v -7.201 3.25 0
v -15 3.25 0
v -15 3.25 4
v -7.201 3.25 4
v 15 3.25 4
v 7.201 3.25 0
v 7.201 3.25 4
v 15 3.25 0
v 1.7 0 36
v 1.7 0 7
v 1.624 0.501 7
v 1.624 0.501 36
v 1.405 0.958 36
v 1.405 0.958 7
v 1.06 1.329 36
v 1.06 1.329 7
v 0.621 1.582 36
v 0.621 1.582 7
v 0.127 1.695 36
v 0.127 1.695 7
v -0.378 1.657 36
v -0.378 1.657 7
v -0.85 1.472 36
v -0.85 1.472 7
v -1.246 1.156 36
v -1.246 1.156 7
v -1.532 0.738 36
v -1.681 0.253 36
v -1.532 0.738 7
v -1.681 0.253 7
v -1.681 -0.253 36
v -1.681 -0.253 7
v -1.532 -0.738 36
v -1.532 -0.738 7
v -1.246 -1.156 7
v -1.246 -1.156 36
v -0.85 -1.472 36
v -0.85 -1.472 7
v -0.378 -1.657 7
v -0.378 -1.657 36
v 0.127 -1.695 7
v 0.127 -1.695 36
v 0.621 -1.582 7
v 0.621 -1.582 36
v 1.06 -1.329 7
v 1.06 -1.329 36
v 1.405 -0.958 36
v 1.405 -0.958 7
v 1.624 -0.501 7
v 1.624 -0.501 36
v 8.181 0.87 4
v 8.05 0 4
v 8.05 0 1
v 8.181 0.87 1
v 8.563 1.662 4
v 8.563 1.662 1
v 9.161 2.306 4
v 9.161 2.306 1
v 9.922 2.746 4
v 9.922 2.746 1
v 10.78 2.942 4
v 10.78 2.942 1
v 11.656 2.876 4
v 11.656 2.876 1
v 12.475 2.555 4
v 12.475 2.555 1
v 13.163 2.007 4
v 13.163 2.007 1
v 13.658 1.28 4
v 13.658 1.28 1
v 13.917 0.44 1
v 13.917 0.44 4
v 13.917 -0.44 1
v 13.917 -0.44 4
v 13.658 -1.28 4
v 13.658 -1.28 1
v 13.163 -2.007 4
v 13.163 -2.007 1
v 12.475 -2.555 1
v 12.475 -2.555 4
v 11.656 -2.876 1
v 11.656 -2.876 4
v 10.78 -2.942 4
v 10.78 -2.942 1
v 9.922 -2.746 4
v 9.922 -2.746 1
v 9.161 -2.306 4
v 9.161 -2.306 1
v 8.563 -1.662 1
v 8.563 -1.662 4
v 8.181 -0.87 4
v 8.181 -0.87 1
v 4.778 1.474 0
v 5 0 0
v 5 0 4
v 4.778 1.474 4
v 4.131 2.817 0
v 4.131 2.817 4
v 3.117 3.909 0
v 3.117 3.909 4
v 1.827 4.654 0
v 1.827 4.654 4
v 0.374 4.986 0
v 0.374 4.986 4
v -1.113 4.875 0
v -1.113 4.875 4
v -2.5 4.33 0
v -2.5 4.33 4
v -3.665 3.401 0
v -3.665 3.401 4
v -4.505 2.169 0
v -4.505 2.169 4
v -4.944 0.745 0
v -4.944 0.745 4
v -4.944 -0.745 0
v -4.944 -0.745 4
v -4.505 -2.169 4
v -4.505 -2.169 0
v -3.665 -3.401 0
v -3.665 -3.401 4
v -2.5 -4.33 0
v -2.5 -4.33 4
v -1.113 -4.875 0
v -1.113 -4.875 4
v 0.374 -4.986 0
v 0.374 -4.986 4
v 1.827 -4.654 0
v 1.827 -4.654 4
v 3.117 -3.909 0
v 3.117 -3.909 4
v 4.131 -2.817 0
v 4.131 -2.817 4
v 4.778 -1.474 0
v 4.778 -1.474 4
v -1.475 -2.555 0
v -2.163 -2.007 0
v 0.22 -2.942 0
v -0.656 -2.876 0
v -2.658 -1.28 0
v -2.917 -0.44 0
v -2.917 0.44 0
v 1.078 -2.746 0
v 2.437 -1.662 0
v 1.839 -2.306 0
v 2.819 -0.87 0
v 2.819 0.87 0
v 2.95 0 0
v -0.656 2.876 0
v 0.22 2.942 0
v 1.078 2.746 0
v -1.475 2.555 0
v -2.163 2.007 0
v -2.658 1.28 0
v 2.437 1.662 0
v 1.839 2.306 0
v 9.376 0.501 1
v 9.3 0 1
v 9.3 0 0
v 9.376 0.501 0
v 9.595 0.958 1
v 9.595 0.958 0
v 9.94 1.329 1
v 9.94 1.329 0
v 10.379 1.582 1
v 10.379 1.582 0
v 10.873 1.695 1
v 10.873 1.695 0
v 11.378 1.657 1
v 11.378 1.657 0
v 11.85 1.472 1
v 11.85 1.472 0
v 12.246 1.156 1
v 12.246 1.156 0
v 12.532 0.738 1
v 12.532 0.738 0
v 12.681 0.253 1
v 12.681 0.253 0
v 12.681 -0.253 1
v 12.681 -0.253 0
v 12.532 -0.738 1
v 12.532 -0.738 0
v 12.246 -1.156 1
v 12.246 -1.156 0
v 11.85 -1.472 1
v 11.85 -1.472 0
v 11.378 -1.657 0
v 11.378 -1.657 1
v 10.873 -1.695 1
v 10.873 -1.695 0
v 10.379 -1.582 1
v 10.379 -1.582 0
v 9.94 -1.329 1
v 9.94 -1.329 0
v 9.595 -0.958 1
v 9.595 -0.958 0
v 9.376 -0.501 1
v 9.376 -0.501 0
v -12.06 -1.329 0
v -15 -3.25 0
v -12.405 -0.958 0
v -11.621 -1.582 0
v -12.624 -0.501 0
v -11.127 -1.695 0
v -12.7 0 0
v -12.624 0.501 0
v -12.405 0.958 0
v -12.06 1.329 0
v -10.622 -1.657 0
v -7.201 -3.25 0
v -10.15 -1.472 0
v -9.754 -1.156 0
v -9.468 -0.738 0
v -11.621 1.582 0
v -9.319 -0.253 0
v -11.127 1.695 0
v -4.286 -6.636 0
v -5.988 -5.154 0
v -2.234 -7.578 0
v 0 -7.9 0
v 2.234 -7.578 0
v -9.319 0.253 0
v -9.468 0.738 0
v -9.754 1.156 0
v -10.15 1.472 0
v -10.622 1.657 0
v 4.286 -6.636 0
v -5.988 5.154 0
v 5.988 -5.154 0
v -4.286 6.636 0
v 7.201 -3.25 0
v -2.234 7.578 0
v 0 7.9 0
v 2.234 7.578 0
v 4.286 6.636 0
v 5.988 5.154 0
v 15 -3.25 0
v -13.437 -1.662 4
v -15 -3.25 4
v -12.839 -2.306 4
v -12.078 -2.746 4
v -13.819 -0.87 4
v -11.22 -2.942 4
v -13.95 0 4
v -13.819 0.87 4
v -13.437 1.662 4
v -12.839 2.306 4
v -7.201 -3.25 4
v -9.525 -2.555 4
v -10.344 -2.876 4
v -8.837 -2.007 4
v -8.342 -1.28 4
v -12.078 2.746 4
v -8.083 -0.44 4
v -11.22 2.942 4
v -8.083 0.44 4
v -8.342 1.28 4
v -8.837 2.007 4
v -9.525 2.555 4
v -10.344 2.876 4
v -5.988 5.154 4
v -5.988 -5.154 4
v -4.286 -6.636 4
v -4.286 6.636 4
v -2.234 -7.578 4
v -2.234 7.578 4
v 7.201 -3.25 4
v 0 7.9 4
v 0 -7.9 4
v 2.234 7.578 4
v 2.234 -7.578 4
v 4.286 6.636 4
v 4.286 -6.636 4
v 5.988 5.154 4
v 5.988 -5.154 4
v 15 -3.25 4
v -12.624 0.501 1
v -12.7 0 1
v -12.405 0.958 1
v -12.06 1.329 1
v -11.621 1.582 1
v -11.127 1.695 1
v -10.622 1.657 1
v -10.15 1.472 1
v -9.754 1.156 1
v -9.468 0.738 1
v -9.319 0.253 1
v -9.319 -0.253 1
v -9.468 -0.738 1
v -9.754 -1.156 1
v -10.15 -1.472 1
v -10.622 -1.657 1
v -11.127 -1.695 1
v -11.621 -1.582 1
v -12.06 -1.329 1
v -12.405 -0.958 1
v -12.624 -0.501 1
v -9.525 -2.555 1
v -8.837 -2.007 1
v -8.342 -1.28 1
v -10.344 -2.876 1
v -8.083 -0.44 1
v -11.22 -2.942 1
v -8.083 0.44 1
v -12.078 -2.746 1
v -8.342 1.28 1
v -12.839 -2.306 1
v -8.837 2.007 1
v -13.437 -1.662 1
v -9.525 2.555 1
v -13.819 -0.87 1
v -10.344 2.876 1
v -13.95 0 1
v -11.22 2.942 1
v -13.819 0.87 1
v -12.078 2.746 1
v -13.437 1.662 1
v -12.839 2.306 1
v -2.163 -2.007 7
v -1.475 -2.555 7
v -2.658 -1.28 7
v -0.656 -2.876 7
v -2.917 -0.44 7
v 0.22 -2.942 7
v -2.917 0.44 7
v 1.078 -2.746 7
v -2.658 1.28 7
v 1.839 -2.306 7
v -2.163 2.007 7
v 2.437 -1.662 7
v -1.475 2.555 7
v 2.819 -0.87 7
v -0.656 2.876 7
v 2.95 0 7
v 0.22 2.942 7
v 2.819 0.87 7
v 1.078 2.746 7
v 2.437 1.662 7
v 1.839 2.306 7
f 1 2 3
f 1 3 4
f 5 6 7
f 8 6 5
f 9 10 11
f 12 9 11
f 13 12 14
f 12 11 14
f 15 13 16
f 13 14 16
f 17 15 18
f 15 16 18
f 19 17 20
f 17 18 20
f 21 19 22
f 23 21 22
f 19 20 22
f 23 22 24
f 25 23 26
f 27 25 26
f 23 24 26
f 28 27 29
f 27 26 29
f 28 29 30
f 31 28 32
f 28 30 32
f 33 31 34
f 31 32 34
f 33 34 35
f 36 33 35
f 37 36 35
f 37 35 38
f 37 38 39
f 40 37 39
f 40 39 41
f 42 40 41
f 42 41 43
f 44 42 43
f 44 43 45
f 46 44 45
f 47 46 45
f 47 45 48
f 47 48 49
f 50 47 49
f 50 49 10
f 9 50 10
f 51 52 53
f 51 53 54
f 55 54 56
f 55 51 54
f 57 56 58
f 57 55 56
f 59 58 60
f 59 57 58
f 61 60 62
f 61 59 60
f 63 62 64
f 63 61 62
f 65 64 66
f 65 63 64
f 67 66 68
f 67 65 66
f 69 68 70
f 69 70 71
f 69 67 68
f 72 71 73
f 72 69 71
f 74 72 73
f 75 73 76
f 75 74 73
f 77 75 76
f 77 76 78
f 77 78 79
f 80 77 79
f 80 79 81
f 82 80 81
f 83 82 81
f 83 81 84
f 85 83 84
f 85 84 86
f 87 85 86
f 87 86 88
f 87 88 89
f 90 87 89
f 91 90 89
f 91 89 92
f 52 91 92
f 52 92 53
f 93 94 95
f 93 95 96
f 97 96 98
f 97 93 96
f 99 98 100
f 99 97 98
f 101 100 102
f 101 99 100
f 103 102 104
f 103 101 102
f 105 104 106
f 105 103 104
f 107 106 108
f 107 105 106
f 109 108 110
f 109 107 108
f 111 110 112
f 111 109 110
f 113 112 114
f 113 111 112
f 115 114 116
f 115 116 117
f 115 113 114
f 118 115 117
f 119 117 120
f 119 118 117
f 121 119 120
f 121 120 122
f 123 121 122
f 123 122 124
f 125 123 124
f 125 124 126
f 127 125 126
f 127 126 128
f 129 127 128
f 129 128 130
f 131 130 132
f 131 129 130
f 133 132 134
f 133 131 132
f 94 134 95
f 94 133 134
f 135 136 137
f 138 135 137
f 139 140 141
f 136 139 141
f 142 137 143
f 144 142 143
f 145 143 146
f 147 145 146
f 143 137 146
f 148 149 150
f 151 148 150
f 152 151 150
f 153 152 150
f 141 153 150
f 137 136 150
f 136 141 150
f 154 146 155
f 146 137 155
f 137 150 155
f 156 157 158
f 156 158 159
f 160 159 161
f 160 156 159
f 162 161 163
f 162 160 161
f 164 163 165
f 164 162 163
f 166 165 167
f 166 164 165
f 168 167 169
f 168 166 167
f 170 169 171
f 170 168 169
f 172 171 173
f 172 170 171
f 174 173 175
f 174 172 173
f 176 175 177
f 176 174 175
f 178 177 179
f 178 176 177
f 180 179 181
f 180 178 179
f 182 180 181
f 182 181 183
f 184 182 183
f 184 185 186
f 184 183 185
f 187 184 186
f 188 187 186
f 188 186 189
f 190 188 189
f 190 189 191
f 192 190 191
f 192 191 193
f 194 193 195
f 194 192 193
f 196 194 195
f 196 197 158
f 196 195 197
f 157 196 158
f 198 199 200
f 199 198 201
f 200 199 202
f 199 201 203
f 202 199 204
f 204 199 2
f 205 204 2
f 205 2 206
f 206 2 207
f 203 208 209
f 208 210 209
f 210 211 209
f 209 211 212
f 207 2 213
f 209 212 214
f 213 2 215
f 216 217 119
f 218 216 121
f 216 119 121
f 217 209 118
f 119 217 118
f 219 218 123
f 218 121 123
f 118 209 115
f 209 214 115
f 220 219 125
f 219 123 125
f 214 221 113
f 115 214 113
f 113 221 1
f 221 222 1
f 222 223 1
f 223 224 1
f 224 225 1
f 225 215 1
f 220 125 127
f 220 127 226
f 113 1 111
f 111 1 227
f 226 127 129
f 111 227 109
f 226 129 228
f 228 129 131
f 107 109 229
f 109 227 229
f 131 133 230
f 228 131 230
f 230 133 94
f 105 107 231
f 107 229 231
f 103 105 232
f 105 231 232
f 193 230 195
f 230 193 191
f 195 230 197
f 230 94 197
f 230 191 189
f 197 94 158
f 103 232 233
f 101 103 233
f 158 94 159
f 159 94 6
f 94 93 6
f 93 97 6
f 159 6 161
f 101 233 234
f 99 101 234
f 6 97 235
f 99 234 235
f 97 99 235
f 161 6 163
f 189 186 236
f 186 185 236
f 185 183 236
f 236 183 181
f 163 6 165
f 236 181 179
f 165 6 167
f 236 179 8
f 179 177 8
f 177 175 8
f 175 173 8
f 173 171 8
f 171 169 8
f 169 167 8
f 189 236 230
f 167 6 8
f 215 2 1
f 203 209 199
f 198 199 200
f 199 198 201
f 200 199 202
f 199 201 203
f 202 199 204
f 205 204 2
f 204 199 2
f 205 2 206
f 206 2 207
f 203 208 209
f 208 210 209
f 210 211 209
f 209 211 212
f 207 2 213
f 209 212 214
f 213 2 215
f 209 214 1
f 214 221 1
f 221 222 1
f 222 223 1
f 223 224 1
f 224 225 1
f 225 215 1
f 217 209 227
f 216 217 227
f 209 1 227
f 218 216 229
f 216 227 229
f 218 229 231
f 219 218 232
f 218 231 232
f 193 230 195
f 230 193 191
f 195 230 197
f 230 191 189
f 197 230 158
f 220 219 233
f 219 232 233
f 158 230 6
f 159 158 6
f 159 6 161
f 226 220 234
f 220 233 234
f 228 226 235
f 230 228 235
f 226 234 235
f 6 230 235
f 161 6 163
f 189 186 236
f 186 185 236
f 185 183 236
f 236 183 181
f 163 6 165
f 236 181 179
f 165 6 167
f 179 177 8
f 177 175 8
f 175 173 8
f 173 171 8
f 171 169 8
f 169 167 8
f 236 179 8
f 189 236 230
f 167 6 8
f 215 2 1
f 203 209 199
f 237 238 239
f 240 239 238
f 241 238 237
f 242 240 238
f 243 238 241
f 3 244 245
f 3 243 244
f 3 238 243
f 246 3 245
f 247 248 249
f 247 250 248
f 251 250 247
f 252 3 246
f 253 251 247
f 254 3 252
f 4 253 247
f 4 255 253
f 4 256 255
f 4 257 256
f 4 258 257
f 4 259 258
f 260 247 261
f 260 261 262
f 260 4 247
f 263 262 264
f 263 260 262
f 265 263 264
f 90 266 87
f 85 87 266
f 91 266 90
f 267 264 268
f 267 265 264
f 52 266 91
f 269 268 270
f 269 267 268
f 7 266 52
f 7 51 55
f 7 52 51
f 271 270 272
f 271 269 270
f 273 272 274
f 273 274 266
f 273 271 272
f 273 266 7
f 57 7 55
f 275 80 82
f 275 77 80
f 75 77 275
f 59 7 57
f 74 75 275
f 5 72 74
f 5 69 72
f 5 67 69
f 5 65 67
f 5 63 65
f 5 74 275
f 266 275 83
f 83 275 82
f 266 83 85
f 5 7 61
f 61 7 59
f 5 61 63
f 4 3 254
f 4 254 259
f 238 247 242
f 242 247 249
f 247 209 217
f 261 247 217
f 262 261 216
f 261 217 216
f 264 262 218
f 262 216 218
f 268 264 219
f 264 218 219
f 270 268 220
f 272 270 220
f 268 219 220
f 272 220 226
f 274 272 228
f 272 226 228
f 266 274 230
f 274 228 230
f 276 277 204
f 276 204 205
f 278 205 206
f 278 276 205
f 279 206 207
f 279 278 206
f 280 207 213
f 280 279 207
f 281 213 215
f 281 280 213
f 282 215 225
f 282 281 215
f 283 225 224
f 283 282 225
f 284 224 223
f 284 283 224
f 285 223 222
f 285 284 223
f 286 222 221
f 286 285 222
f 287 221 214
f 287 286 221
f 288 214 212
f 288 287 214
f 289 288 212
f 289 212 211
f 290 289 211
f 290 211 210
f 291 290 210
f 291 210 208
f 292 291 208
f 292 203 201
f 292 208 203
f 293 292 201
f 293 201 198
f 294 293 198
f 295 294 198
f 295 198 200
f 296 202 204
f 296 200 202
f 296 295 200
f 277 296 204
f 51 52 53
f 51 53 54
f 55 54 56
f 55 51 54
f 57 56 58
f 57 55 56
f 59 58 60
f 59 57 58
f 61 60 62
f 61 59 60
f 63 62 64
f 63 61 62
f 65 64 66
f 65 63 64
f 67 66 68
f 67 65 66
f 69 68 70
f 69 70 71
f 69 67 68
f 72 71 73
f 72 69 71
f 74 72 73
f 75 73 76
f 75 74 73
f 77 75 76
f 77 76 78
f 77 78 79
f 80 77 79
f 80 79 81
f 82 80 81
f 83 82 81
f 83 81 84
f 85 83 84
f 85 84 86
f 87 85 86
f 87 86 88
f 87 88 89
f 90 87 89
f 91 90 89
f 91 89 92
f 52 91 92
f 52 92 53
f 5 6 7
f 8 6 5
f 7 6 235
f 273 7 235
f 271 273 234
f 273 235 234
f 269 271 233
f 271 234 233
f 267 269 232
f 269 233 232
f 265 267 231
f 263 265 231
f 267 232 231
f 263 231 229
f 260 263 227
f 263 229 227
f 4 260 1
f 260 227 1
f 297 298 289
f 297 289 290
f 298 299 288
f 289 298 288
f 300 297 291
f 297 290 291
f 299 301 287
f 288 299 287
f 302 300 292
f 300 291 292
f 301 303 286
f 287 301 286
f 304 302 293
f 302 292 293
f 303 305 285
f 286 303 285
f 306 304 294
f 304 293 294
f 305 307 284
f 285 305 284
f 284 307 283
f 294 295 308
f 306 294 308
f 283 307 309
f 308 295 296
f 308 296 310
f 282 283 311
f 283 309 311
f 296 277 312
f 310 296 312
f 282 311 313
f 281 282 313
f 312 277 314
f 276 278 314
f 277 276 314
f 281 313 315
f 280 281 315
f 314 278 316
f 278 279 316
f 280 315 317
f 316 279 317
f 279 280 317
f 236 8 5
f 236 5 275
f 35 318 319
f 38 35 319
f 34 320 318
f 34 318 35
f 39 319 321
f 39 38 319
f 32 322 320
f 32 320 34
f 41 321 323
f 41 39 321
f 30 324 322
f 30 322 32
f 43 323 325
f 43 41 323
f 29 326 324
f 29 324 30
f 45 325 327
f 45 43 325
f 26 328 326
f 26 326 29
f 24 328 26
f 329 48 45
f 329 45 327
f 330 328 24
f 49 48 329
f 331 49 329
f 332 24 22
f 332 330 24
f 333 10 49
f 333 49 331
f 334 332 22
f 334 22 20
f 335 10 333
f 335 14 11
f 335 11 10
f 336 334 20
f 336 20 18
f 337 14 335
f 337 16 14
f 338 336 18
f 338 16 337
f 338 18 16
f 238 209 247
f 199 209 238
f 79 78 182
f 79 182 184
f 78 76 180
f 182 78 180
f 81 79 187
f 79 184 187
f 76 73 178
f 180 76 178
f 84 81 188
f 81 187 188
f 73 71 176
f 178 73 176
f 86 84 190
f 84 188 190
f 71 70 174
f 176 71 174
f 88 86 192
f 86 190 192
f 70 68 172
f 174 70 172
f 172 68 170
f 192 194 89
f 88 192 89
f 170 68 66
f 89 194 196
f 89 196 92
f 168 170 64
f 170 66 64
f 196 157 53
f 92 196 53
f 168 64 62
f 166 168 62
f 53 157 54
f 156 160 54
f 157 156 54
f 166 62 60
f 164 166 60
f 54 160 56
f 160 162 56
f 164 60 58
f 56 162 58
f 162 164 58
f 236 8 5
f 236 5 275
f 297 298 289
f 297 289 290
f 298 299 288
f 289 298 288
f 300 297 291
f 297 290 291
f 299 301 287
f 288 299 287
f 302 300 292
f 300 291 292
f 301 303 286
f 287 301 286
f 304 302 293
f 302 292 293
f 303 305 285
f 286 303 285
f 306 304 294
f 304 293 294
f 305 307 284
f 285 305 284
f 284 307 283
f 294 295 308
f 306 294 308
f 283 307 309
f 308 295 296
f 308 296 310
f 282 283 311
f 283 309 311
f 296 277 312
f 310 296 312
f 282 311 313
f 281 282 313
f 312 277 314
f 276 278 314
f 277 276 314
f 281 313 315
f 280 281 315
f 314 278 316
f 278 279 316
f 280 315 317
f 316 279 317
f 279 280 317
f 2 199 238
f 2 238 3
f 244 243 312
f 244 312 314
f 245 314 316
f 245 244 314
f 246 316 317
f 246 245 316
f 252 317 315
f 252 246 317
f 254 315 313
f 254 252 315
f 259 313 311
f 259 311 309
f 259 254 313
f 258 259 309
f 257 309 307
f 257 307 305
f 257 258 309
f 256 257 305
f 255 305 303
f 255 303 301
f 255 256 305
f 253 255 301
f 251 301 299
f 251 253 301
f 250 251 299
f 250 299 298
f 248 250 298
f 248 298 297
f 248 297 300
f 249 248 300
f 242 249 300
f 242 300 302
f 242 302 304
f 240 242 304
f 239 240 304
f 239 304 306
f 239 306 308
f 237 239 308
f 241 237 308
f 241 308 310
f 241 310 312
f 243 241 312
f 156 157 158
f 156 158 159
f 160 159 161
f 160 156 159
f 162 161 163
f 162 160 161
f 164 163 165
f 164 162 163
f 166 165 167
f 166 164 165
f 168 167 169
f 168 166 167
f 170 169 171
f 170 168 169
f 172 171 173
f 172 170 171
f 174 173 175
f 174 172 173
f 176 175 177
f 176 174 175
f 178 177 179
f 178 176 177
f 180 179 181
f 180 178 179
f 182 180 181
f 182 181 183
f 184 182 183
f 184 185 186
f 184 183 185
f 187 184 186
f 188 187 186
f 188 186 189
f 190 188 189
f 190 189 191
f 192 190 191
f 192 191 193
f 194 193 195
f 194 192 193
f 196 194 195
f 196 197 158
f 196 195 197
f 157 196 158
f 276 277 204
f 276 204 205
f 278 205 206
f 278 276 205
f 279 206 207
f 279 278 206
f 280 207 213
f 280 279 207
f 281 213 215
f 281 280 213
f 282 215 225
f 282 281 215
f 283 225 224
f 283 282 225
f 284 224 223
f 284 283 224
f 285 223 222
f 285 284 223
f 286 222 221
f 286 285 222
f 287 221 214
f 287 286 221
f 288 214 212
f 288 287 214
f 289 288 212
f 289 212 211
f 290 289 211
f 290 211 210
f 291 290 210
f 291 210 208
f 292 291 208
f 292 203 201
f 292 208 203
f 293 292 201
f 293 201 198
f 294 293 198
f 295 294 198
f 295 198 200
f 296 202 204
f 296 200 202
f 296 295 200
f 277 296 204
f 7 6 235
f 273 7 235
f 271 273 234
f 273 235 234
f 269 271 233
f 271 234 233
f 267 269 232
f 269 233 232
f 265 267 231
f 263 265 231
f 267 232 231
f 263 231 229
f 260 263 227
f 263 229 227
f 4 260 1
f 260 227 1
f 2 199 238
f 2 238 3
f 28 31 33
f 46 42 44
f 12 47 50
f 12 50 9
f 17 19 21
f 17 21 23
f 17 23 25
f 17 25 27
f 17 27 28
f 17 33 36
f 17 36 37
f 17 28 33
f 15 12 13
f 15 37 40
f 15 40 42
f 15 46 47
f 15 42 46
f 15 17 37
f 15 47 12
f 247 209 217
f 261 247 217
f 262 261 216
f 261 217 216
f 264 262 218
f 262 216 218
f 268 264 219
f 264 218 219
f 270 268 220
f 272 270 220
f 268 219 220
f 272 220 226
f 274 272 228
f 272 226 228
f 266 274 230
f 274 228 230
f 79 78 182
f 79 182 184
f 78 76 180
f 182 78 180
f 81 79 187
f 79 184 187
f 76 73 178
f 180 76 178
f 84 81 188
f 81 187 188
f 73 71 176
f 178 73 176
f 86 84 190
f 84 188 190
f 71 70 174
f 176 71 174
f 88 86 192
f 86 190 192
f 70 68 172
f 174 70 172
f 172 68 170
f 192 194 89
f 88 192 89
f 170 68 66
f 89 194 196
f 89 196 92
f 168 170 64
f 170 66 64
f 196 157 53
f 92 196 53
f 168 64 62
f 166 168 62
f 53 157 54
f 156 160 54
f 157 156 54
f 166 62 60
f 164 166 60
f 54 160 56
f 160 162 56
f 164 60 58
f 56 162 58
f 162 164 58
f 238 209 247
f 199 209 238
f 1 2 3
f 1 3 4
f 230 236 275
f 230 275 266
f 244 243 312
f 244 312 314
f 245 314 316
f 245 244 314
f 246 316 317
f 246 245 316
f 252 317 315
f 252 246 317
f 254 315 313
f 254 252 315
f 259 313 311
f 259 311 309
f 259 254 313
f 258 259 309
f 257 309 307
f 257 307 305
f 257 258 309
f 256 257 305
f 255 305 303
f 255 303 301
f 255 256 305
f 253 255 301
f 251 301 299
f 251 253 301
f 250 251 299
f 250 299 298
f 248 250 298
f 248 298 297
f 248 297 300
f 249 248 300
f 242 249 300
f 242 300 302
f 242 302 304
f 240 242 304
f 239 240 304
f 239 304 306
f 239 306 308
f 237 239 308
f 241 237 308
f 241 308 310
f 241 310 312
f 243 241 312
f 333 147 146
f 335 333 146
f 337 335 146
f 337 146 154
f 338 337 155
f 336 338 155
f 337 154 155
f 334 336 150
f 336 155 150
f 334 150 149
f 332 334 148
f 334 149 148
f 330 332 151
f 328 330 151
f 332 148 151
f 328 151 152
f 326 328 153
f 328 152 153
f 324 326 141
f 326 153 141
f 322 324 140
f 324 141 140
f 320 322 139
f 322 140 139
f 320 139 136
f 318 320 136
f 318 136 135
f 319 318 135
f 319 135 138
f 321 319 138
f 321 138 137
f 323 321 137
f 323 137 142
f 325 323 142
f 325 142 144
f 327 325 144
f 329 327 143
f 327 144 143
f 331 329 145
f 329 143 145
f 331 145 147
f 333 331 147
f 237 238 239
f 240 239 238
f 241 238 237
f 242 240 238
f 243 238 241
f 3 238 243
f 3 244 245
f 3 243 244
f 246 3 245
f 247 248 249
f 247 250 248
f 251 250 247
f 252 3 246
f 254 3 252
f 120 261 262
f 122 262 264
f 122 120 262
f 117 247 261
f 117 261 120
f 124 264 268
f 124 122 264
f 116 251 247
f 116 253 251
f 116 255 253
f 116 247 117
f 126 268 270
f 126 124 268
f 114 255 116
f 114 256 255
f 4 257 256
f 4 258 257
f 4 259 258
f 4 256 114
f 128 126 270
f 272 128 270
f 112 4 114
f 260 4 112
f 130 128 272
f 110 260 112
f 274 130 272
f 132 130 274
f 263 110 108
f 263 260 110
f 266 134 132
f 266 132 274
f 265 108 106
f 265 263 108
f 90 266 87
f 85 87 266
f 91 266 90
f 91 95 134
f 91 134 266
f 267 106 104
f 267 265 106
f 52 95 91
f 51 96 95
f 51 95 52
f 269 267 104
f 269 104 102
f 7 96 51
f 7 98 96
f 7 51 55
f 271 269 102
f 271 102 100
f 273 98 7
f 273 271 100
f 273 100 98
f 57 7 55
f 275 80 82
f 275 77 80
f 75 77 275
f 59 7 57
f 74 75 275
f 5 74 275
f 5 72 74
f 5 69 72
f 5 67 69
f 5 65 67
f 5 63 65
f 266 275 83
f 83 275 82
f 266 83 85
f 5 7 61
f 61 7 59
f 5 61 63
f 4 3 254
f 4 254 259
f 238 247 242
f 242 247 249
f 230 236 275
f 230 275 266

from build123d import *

# Parameters (mm, degrees)
CYLINDER_R               = 2.95
CYLINDER_DEPTH           = 7
CYLINDER001_R            = 1.7
CYLINDER001_DEPTH        = 30
CLONE060_PLACEMENT_ANGLE = 180
CLONE059_PLACEMENT_ANGLE = 180
PAD010_DEPTH             = 4
CYLINDER1032_R           = 5
CYLINDER1032_DEPTH       = 4


with BuildPart() as m3bolthead:
    # Cylinder → Cylinder (new body)
    with BuildSketch(Plane.XY):
        Circle(CYLINDER_R)
    extrude(amount=CYLINDER_DEPTH)


with BuildPart() as m3bolt:
    # Cylinder001 → Cylinder001 (new body)
    with BuildSketch(Plane.XY.offset(6)):
        Circle(CYLINDER001_R)
    extrude(amount=CYLINDER001_DEPTH)

    # Fusion: union M3BoltHead
    add(m3bolthead.part)


with BuildPart() as clone_of_m3bolt020:
    # Clone060 base: copy of M3Bolt
    add(m3bolt.part)


with BuildPart() as clone_of_m3bolt020_1:
    # Clone060 placement: moved
    add(clone_of_m3bolt020.part.moved(Location((-11, 0, 8))).rotate(Axis((-11, 0, 8), (0, 1, 0)), CLONE060_PLACEMENT_ANGLE))


with BuildPart() as fusion020:
    # Clone059 base: copy of M3Bolt
    add(m3bolt.part)


with BuildPart() as fusion020_1:
    # Clone059 placement: moved
    add(fusion020.part.moved(Location((11, 0, 8))).rotate(Axis((11, 0, 8), (0, 1, 0)), CLONE059_PLACEMENT_ANGLE))

    # Fusion020: union Clone of M3Bolt020
    add(clone_of_m3bolt020_1.part)


with BuildPart() as f_622zzbearingfixmasterext:
    # Sketch017 → Pad010 (new body)
    with BuildSketch(Plane.XY):
        with BuildLine():
            ThreePointArc((-7.200521, -3.25), (0, -7.9), (7.200521, -3.25))
            Line((15, -3.25), (7.200521, -3.25))
            Line((15, 3.25), (15, -3.25))
            Line((7.200521, 3.25), (15, 3.25))
            ThreePointArc((7.200521, 3.25), (0, 7.9), (-7.200521, 3.25))
            Line((-15, 3.25), (-7.200521, 3.25))
            Line((-15, -3.25), (-15, 3.25))
            Line((-7.200521, -3.25), (-15, -3.25))
        make_face()
    extrude(amount=PAD010_DEPTH)

    # Cut021: cut Fusion020
    add(fusion020_1.part, mode=Mode.SUBTRACT)


with BuildPart() as cylinder1074:
    # Cylinder1032 → Cylinder1032 (new body)
    with BuildSketch(Plane.XY):
        Circle(CYLINDER1032_R)
    extrude(amount=CYLINDER1032_DEPTH)


with BuildPart() as f_625zzbearingfixthrough:
    # Clone312 base: copy of 622zzBearingFixMasterExt
    add(f_622zzbearingfixmasterext.part)

    # Cut092: cut Cylinder1074
    add(cylinder1074.part, mode=Mode.SUBTRACT)


solid = Compound([m3bolt.part, f_622zzbearingfixmasterext.part, f_625zzbearingfixthrough.part])
